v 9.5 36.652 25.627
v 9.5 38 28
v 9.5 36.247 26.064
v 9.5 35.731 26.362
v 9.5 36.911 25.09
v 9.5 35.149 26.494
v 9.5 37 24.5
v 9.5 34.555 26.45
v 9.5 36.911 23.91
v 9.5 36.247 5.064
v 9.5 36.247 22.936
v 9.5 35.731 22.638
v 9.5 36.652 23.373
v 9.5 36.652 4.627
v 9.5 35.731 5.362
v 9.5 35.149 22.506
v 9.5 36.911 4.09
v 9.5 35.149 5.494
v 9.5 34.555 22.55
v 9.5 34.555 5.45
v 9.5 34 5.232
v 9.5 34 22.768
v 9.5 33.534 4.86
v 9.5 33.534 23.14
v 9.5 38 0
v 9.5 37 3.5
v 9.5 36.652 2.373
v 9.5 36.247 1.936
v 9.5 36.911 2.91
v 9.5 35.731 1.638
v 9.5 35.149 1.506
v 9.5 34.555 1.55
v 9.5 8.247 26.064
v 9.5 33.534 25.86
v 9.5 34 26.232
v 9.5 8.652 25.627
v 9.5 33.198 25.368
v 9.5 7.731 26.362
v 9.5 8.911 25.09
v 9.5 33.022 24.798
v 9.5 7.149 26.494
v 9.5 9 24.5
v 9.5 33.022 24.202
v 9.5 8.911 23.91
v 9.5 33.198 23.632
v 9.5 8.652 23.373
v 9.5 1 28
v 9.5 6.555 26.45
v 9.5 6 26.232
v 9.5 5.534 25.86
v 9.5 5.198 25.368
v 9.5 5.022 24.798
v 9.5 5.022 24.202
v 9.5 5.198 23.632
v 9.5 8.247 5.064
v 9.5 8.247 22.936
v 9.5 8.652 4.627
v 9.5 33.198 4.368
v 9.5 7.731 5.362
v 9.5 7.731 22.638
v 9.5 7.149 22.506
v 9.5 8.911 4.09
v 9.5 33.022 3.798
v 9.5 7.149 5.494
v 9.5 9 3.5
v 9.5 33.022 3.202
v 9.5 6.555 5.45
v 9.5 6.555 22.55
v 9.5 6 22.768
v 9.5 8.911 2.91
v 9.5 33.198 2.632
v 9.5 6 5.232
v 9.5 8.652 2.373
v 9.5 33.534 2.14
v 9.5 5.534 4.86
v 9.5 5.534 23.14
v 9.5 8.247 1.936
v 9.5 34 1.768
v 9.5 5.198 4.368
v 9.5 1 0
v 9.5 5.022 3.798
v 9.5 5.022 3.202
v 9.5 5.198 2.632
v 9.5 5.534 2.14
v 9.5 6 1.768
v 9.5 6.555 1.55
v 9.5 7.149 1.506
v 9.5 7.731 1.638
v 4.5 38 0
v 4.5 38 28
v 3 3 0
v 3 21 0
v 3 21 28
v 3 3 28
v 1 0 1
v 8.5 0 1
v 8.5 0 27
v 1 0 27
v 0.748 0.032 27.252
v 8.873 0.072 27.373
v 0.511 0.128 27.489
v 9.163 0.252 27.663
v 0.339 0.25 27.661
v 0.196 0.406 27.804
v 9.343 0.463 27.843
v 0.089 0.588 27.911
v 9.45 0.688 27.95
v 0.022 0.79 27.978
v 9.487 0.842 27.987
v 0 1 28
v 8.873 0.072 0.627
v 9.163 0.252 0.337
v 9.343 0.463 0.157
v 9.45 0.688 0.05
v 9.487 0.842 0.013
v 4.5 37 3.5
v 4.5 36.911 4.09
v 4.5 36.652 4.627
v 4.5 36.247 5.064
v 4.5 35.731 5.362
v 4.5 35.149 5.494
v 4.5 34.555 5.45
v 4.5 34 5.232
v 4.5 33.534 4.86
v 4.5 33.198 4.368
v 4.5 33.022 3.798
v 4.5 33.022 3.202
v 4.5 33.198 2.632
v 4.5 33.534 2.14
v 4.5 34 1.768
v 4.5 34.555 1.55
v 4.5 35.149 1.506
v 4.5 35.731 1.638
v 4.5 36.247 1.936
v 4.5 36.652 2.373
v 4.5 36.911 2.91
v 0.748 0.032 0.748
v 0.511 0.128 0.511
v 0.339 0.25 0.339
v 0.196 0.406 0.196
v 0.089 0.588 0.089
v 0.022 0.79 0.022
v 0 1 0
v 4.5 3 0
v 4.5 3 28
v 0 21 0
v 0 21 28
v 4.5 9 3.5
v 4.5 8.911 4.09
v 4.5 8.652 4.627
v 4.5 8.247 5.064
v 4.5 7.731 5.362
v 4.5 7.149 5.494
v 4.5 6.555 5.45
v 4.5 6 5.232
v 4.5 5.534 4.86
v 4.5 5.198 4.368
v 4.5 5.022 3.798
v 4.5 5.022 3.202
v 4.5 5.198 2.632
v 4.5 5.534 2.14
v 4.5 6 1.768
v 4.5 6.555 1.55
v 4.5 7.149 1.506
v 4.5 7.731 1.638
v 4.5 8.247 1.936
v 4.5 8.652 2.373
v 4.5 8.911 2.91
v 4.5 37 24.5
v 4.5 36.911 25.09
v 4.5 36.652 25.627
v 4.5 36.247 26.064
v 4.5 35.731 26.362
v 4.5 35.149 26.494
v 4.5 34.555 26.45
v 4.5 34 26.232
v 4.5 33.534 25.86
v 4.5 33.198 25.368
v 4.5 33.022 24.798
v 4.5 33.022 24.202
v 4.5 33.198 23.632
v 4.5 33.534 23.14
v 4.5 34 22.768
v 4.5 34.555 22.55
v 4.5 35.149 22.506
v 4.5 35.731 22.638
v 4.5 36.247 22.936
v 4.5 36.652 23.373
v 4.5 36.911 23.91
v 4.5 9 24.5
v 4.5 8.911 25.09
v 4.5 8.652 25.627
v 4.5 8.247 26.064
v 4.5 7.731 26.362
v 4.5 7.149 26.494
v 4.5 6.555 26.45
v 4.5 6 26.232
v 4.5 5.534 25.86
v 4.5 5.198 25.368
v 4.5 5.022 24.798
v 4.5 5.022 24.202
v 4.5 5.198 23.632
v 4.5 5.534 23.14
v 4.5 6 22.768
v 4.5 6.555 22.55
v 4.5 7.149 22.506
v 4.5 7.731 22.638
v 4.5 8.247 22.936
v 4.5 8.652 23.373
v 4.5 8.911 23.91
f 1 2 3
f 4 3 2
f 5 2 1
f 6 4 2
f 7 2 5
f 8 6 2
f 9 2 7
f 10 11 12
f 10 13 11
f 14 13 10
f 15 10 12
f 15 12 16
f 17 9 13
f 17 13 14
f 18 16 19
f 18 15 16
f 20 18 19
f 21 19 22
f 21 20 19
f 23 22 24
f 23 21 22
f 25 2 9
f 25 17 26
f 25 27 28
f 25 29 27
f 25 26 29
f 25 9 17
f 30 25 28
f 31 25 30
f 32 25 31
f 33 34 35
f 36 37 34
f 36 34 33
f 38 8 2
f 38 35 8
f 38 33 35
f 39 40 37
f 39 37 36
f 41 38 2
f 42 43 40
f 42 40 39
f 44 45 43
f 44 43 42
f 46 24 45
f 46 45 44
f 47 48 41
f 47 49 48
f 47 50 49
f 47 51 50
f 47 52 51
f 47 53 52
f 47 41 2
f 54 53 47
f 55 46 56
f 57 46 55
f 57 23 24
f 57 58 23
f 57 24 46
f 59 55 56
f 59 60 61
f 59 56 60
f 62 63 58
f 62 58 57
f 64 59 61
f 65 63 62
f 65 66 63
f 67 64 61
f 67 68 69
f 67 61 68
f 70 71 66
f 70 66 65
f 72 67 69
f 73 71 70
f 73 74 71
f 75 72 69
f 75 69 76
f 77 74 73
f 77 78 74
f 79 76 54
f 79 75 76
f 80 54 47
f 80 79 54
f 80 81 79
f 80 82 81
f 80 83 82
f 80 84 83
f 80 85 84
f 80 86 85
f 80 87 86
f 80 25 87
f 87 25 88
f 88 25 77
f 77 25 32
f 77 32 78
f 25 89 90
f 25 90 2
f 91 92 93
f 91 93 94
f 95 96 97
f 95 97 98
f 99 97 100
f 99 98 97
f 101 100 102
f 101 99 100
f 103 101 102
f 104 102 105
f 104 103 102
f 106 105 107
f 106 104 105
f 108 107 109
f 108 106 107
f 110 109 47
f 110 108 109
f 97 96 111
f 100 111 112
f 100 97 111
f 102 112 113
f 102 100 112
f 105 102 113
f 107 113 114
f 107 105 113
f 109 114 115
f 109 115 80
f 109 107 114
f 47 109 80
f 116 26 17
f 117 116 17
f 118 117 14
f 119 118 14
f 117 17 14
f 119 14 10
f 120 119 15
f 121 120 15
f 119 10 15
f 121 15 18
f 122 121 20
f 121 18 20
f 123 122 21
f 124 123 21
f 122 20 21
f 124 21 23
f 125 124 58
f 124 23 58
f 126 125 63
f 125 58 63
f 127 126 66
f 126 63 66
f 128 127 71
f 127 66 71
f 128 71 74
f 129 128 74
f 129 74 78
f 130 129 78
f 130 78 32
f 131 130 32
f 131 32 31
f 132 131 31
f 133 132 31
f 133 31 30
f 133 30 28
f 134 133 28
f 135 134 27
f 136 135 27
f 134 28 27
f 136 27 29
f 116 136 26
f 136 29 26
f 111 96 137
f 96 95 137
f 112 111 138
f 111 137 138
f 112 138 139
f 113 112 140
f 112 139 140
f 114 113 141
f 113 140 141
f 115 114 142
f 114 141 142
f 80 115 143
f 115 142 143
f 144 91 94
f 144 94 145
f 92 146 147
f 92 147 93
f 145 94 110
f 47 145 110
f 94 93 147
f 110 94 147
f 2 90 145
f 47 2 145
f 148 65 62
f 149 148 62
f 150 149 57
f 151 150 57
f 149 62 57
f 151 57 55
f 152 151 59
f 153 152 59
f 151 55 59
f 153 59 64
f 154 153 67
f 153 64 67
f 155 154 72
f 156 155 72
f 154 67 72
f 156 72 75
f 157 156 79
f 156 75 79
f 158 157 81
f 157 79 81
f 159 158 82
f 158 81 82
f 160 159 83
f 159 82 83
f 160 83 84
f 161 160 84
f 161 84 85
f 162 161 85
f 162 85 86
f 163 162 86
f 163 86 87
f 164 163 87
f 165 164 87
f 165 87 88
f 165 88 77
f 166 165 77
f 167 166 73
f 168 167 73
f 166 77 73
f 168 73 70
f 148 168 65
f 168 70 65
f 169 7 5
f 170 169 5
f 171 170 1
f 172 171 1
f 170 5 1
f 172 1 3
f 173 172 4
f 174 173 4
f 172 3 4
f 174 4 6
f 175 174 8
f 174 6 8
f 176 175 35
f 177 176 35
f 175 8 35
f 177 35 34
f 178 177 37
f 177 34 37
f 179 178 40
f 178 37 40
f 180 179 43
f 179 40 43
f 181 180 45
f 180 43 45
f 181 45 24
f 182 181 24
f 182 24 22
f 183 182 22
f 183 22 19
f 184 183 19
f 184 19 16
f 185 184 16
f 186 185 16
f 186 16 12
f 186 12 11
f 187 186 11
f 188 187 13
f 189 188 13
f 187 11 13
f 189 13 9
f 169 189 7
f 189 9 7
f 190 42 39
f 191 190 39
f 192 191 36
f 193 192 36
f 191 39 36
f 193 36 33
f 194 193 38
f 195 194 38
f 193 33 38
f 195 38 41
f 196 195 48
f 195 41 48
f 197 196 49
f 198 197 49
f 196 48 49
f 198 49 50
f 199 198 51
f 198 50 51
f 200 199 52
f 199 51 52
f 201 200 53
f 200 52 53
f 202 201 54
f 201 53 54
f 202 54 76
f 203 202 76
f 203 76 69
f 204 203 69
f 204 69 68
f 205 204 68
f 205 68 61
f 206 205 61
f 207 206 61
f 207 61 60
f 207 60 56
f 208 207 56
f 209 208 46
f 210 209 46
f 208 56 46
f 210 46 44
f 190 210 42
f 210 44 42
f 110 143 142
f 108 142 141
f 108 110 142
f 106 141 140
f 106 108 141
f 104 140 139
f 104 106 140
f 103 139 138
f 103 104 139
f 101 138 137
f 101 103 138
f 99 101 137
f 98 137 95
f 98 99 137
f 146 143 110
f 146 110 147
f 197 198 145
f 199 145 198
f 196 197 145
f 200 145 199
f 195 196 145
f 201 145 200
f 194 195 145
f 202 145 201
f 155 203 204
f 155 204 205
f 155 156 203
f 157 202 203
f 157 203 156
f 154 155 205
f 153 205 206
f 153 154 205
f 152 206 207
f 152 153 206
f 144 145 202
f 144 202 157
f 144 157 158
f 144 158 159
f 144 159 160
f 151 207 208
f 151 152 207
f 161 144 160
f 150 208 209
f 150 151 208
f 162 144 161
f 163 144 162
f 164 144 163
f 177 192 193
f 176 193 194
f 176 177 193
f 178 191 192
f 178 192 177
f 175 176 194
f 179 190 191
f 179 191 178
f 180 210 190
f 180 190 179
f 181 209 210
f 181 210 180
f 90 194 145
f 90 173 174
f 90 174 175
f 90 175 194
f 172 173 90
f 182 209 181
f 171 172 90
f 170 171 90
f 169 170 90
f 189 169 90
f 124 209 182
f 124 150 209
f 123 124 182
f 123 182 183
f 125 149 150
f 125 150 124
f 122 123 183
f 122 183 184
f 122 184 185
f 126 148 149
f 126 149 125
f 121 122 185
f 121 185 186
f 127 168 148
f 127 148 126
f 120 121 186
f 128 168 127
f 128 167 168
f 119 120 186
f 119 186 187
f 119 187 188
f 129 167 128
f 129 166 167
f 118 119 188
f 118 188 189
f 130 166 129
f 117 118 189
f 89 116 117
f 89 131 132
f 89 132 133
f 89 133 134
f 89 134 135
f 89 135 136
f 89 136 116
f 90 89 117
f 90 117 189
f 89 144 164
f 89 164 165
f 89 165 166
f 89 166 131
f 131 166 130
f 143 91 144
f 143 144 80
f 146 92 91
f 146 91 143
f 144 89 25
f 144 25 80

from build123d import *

# Parameters (mm, degrees)
PAD_DEPTH    = 28
SKETCH001_R  = 2
POCKET_DEPTH = 5
FILLET_R     = 1


with BuildPart() as part:
    # Sketch → Pad (new body)
    with BuildSketch(Plane.XY):
        Polygon((0, 0), (0, 21), (3, 21), (3, 3), (4.5, 3), (4.5, 38), (9.5, 38), (9.5, 0), align=None)
    extrude(amount=PAD_DEPTH)

    # Sketch001 (on Face7 of Pad) → Pocket (cut)
    with BuildSketch(Plane.YZ.offset(9.5)):
        with Locations((7, 24.5)):
            Circle(SKETCH001_R)
        with Locations((35, 24.5)):
            Circle(SKETCH001_R)
        with Locations((7, 3.5)):
            Circle(SKETCH001_R)
        with Locations((35, 3.5)):
            Circle(SKETCH001_R)
    extrude(amount=-POCKET_DEPTH, mode=Mode.SUBTRACT)

    # Fillet
    fillet_edges = [part.edges().sort_by_distance(p)[0] for p in [
        (9.5, 0, 14),
        (0, 0, 14),
        (4.75, 0, 0),
        (4.75, 0, 28),
    ]]
    fillet(fillet_edges, radius=FILLET_R)


solid = part.part
